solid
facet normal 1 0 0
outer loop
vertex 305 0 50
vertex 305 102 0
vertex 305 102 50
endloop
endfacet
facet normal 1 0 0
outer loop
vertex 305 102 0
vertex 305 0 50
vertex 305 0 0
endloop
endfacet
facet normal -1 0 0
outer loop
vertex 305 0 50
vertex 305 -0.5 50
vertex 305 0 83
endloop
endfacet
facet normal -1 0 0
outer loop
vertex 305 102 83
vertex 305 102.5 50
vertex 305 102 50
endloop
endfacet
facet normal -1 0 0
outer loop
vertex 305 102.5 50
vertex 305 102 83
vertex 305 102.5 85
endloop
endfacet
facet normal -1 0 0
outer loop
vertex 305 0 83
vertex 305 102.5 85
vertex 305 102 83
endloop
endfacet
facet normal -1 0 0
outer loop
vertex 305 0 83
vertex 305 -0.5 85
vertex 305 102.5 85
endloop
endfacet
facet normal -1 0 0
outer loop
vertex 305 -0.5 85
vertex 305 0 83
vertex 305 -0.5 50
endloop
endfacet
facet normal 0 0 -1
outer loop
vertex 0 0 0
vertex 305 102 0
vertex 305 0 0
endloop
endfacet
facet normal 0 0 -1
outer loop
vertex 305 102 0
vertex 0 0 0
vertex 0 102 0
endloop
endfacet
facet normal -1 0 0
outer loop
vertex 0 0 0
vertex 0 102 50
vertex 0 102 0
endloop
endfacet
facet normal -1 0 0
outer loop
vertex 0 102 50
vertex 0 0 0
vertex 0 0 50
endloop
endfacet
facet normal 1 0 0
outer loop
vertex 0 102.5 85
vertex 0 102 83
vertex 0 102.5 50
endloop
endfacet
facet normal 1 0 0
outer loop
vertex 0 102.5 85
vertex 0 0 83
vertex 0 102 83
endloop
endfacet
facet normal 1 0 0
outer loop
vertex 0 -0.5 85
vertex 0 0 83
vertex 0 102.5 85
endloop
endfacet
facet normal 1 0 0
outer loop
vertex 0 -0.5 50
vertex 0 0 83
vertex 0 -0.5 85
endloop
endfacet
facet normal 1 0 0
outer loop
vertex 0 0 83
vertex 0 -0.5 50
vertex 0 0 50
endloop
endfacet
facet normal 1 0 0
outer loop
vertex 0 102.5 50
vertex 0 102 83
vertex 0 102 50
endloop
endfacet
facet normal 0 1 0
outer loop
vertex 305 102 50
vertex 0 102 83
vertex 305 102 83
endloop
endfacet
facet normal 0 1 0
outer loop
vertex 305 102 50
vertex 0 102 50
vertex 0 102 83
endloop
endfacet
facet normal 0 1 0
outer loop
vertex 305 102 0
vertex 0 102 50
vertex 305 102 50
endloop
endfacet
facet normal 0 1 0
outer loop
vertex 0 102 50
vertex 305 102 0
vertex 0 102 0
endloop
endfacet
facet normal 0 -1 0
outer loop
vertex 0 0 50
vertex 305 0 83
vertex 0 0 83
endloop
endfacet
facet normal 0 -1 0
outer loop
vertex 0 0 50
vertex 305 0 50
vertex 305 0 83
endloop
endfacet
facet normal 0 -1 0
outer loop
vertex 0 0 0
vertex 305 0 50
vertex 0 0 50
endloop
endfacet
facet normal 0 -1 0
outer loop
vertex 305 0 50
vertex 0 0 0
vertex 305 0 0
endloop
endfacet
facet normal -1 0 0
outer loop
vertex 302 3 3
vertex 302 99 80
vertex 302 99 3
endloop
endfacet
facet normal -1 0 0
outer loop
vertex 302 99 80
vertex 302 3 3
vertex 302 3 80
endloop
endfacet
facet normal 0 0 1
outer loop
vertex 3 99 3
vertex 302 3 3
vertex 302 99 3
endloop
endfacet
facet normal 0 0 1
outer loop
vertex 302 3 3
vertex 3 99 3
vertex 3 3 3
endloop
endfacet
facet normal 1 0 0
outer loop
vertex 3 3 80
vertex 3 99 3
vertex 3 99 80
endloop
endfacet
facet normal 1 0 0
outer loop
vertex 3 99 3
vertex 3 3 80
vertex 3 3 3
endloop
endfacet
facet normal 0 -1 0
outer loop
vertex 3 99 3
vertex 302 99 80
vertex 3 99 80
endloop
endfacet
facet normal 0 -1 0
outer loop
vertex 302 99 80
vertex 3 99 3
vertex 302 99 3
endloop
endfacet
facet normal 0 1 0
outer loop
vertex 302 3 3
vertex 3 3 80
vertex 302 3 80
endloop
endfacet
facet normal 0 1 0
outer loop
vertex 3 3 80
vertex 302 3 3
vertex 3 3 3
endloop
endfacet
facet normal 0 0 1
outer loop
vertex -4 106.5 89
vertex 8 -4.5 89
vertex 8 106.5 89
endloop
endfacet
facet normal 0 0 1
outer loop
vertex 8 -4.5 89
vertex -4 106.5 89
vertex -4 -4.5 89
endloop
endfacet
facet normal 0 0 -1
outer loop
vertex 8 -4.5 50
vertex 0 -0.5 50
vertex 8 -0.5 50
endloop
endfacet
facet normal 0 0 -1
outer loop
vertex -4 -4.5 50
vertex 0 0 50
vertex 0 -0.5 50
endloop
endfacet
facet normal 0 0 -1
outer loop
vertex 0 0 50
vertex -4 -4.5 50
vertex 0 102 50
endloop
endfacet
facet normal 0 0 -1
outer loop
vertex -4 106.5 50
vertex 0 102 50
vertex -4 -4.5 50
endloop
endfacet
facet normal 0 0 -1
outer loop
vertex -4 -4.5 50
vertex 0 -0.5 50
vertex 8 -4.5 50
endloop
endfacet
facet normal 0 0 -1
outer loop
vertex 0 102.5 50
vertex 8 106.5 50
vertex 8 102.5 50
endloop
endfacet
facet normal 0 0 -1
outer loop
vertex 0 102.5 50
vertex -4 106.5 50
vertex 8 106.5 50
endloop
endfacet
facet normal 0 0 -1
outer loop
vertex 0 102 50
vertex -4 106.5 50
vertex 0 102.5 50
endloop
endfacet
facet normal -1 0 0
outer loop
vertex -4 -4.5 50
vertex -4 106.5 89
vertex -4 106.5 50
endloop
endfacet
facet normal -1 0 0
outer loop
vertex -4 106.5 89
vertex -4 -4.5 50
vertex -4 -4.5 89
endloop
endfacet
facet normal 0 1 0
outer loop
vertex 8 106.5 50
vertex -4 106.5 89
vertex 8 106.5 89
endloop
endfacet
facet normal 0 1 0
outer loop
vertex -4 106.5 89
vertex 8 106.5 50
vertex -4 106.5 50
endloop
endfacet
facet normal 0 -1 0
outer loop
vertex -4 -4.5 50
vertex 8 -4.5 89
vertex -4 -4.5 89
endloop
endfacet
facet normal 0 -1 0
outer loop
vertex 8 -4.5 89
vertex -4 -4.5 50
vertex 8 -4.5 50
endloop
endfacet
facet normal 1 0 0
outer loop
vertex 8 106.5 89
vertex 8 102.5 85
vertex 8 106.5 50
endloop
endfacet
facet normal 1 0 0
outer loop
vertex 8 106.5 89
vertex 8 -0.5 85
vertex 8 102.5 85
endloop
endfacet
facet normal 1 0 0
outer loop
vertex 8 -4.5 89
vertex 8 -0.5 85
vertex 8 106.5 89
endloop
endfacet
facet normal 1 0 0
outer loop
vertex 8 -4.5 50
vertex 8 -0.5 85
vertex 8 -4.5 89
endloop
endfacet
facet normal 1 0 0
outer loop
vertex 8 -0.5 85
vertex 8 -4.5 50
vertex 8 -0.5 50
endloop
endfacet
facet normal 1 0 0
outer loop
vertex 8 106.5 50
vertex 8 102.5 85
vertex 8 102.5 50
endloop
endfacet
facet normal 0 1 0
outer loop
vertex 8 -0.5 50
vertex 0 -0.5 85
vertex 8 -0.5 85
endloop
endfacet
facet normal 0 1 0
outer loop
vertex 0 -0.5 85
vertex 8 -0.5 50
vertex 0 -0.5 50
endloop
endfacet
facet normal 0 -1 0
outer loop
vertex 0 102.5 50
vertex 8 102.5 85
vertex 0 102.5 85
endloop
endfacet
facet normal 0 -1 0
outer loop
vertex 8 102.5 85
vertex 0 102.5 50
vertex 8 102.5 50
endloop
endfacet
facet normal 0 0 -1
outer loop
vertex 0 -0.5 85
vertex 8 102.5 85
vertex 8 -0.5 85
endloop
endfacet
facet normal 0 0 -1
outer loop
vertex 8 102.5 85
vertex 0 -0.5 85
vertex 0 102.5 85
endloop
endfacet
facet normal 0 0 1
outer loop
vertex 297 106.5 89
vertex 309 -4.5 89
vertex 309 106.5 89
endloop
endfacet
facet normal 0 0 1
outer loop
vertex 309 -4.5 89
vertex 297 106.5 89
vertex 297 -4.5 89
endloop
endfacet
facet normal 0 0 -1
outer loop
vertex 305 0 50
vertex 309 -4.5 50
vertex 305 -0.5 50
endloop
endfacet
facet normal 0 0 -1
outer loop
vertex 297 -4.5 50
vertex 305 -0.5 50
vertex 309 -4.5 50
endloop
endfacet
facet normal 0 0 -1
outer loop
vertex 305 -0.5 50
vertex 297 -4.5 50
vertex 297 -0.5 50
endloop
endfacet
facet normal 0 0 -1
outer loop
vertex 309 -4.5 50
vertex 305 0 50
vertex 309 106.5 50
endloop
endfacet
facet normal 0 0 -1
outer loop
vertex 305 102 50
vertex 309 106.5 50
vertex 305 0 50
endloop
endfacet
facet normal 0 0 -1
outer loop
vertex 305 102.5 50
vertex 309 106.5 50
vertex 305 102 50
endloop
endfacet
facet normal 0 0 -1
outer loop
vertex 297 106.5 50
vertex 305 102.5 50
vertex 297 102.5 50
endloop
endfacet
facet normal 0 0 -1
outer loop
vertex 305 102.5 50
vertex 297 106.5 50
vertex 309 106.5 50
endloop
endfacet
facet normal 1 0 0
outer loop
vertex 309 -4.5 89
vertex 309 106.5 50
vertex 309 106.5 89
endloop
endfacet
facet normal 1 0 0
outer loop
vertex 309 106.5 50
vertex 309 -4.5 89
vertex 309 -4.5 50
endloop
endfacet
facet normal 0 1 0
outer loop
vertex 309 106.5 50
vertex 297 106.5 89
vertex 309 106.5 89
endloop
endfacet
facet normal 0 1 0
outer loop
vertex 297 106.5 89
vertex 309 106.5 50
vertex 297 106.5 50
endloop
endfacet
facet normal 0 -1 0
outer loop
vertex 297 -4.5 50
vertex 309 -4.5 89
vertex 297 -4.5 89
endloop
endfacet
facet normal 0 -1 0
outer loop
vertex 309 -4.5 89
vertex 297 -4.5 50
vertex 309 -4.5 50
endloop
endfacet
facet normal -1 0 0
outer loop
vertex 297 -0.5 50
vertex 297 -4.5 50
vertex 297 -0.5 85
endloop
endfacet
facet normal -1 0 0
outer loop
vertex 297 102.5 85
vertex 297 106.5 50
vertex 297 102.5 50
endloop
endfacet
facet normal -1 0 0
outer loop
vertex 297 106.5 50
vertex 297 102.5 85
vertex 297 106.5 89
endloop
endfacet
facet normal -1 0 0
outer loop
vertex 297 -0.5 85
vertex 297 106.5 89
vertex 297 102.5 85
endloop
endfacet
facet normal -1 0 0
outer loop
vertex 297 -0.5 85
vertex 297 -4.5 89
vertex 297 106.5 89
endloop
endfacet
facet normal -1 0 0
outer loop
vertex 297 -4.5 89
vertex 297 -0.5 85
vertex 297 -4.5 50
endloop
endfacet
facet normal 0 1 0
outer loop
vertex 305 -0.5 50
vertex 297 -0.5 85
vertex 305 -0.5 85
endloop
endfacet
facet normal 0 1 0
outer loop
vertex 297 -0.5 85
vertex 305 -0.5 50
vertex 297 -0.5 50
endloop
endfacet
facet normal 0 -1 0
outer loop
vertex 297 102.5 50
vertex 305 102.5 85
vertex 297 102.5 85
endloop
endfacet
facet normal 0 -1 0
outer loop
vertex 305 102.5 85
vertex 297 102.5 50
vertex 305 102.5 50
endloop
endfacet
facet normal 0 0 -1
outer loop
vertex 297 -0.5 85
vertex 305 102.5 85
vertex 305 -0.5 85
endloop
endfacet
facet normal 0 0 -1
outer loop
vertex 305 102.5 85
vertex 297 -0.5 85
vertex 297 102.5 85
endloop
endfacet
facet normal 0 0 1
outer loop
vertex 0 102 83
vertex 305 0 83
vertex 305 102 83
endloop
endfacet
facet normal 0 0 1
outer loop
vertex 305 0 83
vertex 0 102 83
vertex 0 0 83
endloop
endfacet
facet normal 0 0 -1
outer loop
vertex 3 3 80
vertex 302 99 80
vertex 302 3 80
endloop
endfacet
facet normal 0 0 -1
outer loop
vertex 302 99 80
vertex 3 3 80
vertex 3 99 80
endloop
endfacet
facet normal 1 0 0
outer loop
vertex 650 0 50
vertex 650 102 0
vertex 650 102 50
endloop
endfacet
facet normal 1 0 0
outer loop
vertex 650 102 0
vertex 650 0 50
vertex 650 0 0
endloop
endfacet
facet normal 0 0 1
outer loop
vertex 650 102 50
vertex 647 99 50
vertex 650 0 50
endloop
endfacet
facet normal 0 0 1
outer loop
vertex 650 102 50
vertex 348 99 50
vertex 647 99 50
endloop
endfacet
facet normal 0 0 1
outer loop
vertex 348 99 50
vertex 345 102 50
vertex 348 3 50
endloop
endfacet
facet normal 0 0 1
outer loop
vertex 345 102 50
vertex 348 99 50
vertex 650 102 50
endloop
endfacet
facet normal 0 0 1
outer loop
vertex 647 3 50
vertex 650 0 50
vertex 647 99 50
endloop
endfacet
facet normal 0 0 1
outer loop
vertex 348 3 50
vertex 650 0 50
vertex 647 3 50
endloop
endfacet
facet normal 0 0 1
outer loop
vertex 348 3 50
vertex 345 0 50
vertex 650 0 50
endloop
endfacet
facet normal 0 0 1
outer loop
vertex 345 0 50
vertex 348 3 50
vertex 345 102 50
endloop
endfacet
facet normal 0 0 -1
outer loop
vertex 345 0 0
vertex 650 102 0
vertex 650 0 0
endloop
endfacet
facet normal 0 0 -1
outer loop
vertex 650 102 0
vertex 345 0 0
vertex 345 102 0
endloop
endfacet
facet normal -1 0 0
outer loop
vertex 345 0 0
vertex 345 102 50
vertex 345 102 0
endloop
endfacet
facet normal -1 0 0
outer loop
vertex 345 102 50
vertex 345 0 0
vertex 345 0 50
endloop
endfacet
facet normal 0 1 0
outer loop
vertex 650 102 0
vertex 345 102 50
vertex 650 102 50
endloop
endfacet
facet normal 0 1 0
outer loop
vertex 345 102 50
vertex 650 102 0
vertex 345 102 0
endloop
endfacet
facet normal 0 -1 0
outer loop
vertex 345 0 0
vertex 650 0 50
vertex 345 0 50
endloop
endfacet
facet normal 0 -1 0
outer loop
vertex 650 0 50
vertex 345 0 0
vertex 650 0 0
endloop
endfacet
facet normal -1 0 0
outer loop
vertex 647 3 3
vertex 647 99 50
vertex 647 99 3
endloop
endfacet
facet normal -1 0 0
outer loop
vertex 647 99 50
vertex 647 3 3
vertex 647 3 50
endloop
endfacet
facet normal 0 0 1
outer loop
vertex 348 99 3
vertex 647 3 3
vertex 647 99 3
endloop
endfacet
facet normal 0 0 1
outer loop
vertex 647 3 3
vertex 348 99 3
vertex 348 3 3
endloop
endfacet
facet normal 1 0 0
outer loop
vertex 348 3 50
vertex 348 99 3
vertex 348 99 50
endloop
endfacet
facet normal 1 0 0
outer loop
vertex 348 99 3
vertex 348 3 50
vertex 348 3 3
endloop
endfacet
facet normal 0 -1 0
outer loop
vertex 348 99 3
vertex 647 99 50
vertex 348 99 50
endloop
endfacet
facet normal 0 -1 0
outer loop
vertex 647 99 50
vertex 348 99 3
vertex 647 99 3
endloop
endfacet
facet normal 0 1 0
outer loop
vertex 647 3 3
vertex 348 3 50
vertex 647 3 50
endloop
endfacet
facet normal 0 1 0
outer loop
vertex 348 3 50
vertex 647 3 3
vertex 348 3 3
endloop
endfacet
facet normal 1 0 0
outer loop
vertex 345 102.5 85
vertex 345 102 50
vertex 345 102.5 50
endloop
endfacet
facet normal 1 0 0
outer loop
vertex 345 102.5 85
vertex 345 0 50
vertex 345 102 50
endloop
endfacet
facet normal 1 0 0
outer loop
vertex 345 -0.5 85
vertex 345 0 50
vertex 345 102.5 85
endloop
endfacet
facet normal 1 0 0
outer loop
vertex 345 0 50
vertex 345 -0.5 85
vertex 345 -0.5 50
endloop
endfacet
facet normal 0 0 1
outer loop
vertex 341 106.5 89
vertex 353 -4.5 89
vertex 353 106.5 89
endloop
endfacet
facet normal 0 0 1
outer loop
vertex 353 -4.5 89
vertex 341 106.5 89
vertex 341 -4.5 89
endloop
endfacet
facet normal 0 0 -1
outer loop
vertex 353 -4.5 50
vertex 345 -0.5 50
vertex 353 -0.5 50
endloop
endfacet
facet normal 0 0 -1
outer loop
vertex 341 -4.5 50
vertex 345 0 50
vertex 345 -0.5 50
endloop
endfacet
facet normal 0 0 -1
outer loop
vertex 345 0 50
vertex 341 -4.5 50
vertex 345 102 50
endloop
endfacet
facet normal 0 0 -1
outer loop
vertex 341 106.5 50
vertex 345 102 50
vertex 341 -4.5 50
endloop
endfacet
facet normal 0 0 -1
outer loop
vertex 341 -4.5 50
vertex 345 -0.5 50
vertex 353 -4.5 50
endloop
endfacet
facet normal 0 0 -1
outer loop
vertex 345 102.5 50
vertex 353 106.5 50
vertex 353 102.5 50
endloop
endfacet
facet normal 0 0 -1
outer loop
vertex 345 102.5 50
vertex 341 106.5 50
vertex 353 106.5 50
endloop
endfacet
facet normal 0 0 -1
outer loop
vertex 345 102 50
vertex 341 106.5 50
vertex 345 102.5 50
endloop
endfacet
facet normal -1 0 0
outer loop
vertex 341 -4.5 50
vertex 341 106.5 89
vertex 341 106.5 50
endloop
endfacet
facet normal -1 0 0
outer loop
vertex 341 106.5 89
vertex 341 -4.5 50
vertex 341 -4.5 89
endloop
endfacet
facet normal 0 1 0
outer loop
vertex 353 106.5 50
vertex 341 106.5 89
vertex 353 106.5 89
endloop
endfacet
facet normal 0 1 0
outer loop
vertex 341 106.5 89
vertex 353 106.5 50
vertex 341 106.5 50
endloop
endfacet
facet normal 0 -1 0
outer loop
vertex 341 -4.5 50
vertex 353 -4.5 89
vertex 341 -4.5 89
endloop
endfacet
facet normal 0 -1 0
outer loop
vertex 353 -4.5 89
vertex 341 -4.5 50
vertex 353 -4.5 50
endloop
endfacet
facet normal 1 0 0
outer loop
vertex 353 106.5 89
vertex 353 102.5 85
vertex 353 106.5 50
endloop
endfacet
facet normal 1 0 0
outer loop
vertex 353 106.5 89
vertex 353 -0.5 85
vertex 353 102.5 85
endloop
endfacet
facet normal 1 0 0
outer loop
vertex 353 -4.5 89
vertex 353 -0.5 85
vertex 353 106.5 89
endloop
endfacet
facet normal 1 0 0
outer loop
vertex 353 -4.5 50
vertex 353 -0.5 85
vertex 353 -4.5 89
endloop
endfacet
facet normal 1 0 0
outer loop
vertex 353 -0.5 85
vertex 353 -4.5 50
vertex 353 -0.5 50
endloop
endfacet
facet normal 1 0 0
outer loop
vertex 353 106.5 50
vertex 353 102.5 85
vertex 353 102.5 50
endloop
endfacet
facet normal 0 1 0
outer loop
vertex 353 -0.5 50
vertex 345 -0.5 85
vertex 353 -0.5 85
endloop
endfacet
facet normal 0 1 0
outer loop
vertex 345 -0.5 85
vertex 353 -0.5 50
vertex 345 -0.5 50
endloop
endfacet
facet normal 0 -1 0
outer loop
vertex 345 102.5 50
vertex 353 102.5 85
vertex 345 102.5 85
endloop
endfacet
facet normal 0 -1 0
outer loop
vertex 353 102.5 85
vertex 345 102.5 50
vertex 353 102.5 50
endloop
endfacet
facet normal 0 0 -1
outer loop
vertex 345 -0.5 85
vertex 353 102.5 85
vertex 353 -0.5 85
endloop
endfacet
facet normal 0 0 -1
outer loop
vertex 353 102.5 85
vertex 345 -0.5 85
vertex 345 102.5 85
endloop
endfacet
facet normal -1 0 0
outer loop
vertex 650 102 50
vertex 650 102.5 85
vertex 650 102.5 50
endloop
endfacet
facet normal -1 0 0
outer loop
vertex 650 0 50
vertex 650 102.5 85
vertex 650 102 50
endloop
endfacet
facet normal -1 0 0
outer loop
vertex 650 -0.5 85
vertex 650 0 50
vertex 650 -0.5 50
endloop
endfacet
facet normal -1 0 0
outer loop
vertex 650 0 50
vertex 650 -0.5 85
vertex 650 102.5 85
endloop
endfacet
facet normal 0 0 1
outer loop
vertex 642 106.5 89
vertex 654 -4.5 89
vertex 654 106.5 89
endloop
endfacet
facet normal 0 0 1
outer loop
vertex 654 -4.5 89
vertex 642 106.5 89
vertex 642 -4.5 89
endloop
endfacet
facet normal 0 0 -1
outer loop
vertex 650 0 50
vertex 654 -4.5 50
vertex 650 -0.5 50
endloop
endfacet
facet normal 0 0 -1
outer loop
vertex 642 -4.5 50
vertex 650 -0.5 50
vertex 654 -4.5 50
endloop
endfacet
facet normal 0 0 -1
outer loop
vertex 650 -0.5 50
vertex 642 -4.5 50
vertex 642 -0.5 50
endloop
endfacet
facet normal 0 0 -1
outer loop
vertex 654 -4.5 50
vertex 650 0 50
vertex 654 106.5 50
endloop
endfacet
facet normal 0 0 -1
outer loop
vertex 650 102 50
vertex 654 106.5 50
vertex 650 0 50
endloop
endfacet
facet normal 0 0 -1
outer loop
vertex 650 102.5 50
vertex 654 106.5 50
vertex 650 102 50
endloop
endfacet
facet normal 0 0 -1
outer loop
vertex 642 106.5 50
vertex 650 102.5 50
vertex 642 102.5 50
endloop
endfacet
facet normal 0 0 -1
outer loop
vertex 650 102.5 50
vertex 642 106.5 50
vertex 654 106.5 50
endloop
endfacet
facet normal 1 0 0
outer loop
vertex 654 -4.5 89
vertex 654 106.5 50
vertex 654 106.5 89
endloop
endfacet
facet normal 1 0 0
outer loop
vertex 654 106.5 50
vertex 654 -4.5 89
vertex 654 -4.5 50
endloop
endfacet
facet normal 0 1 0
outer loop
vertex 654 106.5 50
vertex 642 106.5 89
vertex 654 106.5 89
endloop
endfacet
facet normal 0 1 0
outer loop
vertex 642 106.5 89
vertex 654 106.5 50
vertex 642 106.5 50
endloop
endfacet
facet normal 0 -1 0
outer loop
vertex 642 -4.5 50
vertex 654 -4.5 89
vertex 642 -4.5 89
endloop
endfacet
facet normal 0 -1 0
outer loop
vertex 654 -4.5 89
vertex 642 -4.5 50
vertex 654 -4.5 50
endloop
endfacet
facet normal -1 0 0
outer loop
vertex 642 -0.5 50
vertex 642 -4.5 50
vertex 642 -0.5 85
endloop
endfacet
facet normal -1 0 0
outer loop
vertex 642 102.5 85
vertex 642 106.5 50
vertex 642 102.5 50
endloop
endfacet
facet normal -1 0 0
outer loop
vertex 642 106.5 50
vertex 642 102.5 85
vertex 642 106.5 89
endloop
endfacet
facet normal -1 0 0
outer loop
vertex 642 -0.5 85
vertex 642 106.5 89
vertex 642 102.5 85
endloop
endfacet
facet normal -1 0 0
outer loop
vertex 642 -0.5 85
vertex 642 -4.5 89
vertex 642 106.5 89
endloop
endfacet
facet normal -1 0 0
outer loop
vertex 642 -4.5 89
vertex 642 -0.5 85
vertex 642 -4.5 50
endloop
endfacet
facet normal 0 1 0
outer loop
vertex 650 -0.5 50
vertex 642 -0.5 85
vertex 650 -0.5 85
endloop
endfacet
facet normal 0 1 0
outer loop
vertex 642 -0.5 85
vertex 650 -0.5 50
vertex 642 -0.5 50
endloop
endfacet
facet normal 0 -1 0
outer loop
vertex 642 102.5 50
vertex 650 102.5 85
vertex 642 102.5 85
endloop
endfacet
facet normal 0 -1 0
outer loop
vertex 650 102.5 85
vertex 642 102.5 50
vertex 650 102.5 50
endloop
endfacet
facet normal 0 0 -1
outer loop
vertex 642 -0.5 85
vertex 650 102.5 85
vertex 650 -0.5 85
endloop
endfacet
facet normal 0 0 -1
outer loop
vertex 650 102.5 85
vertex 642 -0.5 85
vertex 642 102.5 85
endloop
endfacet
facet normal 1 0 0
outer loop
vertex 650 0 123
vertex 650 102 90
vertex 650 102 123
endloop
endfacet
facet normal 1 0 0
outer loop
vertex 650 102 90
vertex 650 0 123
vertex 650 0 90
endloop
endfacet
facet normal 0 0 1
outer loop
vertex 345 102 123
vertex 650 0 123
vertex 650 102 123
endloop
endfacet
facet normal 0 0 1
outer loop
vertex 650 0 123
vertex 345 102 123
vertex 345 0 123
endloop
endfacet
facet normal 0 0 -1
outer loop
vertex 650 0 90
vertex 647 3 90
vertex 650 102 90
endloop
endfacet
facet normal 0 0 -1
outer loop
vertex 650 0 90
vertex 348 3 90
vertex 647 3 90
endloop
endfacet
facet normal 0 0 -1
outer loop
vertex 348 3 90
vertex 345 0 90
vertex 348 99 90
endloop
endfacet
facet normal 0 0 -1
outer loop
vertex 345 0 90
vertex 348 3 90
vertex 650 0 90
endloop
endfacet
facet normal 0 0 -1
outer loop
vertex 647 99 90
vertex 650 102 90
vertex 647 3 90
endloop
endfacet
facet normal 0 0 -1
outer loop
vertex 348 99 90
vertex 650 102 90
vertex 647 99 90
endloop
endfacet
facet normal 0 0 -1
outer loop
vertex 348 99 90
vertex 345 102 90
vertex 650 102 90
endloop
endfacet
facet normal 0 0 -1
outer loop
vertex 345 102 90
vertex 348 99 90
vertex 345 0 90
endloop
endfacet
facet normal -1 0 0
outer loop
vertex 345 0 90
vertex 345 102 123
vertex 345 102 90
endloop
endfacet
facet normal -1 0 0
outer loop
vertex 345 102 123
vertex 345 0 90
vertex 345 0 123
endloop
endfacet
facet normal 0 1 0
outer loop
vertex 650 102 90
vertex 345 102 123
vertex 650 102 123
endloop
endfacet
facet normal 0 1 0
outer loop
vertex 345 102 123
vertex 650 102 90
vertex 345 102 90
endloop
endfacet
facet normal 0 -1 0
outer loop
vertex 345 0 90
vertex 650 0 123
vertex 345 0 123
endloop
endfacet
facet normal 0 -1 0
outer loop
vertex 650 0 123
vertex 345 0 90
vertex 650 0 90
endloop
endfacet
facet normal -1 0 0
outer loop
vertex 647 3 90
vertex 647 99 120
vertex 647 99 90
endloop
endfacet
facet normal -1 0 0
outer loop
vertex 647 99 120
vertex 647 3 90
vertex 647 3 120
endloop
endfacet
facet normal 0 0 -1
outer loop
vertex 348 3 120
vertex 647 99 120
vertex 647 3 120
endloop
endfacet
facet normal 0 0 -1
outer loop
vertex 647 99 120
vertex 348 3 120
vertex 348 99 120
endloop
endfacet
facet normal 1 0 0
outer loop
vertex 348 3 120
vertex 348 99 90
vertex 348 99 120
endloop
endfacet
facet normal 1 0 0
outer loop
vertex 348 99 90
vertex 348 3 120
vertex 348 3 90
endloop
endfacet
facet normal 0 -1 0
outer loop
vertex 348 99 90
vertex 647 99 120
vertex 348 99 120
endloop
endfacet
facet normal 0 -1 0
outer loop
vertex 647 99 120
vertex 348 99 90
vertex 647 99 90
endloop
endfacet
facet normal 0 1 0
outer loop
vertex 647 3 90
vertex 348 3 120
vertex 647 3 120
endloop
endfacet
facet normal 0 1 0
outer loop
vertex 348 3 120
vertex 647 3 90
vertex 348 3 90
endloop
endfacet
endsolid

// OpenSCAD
// 05_saddle.scad
// RETROFIT: "Saddle" end-bracket — a tall U-channel at each SHORT end of the new tray.
// Each saddle straddles the top tray's short-end outer wall from outside,
// and a wide shelf at the top hooks OVER the top rim along the entire end width.
// Unlike corner clips (point-grab) this spans the full 102 mm short-end width.
// Engagement: lower top tray straight down into both saddle channels.
// Release: tilt top tray (rock one end up) to unhook it from the saddles.
// TOP TRAY FIXED — NO geometry added to it.
//
// LEFT: ENGAGED  |  RIGHT: EXPLODED (top tray tilted/lifted)

TW = 305; TD = 102; TH = 33;
NW = 305; ND = 102; NH = 50;
wall = 3;

// saddle geometry
sad_wall  = 4.0;   // saddle plate thickness
sad_h     = TH + 6; // saddle inner height (clears TH, leaves room for lip)
lip_ext   = 8;     // rim-hook shelf width (overhangs inward)
lip_t     = 4;     // rim-hook shelf thickness
gap       = 0.5;   // clearance inside saddle channel around top tray end wall

// The saddle channel width = TD + 2*gap (fits snugly around short end)
// The saddle wraps in Y: from y = -sad_wall-gap to y = TD+gap+sad_wall
ch_inner = TD + 2*gap;         // inner channel width in Y
ch_outer = ch_inner + 2*sad_wall; // outer width

C_new  = "#1565C0";
C_top  = "#90A4AE";
C_clip = "#00695C";  // teal — saddle brackets

sep = NW + 40;

module new_tray_body() {
    color(C_new)
    difference() {
        cube([NW, ND, NH]);
        translate([wall, wall, wall])
            cube([NW-2*wall, ND-2*wall, NH]);
    }
}

module top_tray_body(dz=0) {
    color(C_top)
    translate([0, 0, NH + dz])
    difference() {
        cube([TW, TD, TH]);
        translate([wall, wall, 0])
            cube([TW-2*wall, TD-2*wall, TH-wall]);
    }
}

// One saddle at x=0 end.  Local origin at (x=0, y=-gap-sad_wall, z=NH).
// Channel opens in +X (toward tray interior).
// U shape: two side walls + back face, open toward +X.
module saddle_end() {
    color(C_clip)
    union() {
        // back plate (outside face, x=0 side) — closes the U
        translate([-sad_wall, -sad_wall - gap, 0])
            cube([sad_wall, ch_outer, sad_h]);

        // front-Y side wall (y < 0)
        translate([-sad_wall, -sad_wall - gap, 0])
            cube([sad_wall + lip_ext, sad_wall, sad_h]);

        // back-Y side wall (y > TD)
        translate([-sad_wall, TD + gap, 0])
            cube([sad_wall + lip_ext, sad_wall, sad_h]);

        // rim-hook shelf at top — spans full channel outer width, inward reach
        translate([-sad_wall, -sad_wall - gap, sad_h - lip_t])
            cube([sad_wall + lip_ext, ch_outer, lip_t]);
    }
}

module all_saddles() {
    // x=0 end
    translate([0, 0, NH]) saddle_end();
    // x=NW end — mirror X
    translate([NW, 0, NH]) mirror([1,0,0]) saddle_end();
}

// ENGAGED
translate([0,0,0]) {
    new_tray_body();
    all_saddles();
    top_tray_body(0);
}

// EXPLODED (top tray lifted)
translate([sep,0,0]) {
    new_tray_body();
    all_saddles();
    top_tray_body(40);
}
